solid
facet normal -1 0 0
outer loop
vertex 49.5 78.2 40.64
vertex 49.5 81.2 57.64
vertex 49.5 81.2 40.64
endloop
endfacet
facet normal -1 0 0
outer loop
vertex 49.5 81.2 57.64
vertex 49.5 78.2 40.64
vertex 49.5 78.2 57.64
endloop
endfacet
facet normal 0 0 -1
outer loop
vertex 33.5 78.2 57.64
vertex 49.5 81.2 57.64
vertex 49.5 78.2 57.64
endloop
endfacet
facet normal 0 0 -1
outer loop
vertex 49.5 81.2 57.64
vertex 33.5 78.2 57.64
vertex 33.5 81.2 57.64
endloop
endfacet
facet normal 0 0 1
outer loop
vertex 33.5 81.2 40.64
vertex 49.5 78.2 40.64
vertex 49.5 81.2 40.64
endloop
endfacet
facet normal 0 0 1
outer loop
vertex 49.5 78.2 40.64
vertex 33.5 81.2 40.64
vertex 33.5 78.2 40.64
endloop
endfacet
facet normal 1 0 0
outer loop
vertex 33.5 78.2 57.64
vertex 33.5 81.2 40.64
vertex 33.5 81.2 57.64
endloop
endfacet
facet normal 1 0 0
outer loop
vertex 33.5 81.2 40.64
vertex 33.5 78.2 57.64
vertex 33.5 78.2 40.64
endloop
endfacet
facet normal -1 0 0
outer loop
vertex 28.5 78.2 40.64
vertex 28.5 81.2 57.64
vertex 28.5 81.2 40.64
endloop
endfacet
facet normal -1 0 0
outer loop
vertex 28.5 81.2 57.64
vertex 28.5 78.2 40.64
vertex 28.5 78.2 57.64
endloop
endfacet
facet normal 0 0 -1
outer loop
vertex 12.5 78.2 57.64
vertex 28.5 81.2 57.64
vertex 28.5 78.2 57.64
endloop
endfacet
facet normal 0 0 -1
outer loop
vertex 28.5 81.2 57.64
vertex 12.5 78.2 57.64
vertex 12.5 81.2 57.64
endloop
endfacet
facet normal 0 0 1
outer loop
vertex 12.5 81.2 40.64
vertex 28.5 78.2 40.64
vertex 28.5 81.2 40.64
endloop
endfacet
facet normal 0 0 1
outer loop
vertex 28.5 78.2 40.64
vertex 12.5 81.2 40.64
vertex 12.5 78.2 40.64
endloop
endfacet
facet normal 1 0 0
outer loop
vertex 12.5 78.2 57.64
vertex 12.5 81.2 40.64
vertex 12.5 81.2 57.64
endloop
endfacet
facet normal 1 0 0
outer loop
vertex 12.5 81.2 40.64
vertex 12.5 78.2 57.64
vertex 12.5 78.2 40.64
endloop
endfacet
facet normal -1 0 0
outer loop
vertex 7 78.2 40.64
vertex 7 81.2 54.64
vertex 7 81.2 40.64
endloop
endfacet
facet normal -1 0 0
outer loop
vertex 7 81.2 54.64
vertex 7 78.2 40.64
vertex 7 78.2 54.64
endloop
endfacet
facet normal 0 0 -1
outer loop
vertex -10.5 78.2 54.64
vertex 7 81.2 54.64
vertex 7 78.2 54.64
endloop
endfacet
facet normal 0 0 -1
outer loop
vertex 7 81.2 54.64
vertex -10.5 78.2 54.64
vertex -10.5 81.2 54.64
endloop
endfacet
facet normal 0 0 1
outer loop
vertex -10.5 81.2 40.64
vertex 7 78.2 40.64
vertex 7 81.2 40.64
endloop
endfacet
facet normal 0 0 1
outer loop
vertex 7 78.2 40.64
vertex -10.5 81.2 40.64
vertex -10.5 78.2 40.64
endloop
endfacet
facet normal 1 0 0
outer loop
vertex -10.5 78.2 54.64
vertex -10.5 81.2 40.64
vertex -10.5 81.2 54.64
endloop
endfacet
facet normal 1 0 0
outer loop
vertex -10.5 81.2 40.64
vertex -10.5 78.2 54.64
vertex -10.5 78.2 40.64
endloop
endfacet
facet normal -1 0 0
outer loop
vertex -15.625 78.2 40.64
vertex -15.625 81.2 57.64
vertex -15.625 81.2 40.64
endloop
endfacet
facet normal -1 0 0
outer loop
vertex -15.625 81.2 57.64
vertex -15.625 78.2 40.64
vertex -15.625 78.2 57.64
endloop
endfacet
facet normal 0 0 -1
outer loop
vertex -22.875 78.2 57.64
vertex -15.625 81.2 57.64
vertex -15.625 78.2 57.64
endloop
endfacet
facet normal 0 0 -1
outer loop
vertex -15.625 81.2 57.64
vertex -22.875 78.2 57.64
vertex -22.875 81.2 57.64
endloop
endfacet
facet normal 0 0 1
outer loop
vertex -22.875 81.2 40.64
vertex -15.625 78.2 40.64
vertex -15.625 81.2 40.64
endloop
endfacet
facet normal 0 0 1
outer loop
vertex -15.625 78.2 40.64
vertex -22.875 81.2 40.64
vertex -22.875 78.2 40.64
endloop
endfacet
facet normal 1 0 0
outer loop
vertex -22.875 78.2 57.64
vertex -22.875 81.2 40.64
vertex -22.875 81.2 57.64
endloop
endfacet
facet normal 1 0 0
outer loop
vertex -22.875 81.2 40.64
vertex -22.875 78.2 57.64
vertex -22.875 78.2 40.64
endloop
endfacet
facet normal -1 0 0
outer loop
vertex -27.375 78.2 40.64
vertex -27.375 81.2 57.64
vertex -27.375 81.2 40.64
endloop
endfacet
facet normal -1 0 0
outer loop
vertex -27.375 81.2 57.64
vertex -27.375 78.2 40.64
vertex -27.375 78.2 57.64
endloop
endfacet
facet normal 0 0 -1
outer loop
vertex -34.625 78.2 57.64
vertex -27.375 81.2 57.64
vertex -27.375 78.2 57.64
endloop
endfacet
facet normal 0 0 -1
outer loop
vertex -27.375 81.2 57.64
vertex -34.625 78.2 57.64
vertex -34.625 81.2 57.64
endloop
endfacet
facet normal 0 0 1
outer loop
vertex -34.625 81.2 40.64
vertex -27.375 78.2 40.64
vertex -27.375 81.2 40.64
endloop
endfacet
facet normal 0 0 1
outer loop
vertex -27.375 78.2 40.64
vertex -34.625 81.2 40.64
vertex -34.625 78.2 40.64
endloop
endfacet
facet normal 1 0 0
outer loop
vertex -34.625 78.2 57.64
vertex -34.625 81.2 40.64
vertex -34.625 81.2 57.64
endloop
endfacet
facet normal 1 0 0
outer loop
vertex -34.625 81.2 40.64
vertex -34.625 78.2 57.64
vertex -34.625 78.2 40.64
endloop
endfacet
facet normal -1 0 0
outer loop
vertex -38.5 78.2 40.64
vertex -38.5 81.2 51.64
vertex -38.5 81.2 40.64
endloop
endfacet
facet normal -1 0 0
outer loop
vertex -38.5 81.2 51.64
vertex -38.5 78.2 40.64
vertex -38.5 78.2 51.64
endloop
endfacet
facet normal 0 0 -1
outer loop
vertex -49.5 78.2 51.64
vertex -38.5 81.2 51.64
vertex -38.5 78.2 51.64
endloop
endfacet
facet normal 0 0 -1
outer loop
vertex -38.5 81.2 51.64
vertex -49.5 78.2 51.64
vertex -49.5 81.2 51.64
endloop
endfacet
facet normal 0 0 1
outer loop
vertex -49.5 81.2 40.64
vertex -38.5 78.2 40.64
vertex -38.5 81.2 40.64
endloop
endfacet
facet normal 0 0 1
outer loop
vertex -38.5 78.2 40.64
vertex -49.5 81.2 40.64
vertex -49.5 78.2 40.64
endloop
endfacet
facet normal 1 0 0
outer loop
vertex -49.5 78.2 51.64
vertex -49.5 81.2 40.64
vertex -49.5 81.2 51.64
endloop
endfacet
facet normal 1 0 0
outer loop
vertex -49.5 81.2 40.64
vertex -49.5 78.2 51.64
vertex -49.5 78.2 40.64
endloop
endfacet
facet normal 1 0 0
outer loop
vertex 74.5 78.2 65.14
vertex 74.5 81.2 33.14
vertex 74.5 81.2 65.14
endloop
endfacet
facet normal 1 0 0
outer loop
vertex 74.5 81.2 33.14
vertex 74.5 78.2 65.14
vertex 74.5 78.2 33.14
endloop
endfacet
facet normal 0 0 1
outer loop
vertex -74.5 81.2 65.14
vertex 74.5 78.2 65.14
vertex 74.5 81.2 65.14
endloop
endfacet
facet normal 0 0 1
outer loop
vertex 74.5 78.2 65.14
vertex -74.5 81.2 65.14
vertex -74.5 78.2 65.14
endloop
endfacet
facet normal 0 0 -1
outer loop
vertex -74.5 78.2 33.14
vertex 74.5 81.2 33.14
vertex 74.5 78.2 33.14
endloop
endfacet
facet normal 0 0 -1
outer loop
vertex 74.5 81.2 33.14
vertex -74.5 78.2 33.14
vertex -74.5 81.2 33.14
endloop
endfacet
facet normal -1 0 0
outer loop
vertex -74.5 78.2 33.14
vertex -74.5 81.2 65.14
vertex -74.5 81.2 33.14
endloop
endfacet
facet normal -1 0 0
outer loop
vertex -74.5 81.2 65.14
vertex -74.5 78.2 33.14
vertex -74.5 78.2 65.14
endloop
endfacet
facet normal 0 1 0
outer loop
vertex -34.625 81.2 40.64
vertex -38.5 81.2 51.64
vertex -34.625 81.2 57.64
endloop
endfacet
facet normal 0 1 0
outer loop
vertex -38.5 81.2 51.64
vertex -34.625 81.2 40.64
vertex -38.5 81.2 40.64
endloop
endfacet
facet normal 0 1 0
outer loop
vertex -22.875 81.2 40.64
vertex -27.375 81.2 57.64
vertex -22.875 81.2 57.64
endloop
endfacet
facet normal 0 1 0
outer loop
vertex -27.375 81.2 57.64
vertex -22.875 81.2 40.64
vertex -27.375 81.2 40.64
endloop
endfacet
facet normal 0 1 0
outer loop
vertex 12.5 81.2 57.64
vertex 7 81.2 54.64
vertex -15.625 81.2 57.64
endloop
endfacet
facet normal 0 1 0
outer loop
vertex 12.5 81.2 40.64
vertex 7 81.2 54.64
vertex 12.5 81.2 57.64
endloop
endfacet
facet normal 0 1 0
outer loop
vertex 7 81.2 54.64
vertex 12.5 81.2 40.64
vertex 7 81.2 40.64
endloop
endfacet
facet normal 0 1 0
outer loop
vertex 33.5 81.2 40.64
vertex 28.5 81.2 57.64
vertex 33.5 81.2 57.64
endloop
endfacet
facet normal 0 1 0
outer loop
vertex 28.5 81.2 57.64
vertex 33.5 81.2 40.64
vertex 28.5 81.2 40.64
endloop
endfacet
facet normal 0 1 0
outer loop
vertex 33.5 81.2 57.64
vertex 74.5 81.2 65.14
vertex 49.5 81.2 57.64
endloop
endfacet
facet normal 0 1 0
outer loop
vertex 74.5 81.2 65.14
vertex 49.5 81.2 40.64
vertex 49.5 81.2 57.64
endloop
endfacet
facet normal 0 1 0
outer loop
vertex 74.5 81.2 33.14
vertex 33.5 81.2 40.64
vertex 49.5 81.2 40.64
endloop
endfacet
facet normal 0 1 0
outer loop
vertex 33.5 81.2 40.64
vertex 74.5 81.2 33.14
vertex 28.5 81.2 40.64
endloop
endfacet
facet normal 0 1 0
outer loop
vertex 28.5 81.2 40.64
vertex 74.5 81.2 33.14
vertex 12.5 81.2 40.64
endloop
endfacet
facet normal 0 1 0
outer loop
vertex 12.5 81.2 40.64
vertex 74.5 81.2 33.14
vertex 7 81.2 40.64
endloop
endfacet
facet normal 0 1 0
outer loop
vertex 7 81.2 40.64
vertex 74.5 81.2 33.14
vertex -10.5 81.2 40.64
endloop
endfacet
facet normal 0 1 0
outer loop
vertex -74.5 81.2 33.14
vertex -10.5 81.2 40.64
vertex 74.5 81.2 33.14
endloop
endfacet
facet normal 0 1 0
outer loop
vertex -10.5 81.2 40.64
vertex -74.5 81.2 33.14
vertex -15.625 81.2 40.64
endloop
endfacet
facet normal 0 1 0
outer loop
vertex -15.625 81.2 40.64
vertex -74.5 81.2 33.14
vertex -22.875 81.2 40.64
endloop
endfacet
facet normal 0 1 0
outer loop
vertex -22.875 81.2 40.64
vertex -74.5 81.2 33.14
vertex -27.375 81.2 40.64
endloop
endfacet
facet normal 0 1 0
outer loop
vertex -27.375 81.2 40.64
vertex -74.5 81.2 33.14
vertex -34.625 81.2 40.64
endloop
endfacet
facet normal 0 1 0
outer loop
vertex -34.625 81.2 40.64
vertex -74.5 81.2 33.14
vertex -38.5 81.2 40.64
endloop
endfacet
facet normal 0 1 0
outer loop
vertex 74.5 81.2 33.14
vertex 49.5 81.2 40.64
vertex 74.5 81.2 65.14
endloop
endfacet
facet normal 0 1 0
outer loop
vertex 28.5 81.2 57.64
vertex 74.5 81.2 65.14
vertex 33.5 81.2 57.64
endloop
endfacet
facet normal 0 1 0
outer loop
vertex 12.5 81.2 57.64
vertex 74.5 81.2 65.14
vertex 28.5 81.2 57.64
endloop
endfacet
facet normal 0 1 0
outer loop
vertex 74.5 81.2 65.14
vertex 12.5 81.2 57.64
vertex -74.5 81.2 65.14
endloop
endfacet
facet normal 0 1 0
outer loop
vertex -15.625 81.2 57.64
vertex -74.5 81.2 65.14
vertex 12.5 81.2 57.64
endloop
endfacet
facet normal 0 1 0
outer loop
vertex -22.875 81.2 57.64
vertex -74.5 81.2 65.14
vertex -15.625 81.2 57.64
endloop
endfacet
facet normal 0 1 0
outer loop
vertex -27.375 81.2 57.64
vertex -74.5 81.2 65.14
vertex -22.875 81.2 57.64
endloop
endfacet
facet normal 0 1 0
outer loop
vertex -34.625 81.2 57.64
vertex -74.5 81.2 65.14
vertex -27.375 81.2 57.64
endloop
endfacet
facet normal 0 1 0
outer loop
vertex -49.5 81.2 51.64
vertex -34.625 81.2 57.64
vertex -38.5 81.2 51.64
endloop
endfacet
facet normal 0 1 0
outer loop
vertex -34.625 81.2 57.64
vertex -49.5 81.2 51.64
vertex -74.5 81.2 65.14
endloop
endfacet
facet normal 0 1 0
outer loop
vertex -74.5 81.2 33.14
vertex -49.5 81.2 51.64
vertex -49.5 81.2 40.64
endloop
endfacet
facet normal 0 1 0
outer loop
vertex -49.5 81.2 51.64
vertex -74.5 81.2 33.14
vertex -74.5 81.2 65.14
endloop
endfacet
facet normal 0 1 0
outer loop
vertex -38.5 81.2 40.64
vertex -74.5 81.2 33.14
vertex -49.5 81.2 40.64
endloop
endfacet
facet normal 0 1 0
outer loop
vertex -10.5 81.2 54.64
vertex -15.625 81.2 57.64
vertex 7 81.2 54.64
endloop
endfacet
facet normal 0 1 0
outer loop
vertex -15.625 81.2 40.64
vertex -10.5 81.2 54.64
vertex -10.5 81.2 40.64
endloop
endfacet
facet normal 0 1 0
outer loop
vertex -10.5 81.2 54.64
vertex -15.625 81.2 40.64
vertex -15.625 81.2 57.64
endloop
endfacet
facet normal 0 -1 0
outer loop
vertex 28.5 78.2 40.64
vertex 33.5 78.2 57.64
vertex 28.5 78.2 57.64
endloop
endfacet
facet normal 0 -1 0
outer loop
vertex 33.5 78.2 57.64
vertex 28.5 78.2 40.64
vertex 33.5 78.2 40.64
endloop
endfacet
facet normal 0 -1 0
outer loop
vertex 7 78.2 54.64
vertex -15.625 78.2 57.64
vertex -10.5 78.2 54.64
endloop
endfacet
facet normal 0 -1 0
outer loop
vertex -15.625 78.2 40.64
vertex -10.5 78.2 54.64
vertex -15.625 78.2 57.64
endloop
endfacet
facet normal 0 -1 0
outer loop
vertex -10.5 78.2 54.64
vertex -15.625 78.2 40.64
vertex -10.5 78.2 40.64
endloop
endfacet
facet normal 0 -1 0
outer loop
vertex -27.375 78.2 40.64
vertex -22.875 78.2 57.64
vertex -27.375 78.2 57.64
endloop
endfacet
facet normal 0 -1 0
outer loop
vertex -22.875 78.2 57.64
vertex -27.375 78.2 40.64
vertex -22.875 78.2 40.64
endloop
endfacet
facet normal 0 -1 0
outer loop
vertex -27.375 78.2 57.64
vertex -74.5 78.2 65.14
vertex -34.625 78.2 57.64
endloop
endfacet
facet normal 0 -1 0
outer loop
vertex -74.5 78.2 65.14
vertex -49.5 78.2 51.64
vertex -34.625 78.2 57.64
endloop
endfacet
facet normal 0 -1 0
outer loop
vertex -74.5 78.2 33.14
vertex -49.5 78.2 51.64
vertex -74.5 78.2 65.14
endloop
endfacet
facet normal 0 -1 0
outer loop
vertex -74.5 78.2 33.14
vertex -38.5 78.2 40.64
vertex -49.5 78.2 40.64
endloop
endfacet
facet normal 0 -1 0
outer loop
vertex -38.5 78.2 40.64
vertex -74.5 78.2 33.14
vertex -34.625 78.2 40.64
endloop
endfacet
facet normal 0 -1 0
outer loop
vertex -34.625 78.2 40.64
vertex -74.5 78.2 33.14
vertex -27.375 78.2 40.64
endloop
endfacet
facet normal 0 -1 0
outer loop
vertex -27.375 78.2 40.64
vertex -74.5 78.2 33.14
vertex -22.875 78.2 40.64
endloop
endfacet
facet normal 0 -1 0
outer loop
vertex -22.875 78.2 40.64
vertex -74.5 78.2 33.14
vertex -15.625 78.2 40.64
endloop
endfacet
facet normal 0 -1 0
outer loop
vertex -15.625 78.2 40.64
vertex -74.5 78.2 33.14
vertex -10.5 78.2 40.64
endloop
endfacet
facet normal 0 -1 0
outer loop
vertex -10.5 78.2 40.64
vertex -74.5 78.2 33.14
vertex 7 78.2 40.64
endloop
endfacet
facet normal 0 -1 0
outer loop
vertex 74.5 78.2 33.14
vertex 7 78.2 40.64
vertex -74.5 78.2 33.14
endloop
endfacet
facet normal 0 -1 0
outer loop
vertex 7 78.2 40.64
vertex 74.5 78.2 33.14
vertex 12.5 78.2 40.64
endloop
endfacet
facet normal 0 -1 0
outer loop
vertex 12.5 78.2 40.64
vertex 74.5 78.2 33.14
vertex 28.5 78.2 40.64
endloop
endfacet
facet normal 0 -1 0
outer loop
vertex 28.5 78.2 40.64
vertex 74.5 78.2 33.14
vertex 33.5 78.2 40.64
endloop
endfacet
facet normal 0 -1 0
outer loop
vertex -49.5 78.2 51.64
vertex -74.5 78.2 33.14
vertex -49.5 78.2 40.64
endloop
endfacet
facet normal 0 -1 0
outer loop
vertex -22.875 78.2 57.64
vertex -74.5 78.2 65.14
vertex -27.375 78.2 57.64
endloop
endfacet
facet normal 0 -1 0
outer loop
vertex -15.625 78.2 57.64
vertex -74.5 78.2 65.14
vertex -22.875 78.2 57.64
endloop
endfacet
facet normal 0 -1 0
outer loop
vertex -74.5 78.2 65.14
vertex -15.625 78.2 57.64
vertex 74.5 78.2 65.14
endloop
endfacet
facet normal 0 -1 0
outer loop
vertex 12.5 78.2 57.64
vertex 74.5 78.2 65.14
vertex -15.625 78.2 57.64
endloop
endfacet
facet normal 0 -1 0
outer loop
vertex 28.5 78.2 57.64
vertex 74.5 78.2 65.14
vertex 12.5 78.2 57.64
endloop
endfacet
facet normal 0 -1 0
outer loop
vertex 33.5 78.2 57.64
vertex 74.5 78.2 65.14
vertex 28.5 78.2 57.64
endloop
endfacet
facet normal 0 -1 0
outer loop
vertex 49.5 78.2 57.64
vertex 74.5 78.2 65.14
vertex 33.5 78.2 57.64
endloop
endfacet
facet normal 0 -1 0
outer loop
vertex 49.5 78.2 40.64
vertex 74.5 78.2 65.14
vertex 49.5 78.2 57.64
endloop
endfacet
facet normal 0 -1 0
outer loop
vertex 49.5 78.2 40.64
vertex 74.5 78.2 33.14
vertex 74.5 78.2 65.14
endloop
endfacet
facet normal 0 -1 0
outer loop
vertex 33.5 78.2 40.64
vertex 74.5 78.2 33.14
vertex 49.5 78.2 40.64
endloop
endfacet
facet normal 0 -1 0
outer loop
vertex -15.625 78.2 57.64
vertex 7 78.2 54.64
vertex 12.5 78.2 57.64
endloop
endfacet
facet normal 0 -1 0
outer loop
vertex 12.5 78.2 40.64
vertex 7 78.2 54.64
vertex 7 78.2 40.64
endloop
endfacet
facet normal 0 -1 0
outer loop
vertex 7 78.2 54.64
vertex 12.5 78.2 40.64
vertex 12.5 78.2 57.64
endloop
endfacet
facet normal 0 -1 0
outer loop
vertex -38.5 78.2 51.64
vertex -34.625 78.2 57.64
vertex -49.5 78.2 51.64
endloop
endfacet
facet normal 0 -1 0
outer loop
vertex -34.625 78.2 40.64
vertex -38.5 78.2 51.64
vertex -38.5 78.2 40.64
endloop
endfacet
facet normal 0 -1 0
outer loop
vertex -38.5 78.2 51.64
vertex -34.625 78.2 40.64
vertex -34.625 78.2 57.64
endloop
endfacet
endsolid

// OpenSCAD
//
// ============================================================================
// SteamMachine UM790
// Project Phoenix
//
// Archivo  : probeta_panel_trasero.scad
// Versión  : 1.0
// Fecha    : 2026-08-16
// Autor    : Pep Ventura (asistido por Claude)
//
// PROBETA DE PRUEBA — no es la pieza definitiva. Solo la franja con
// los 6 recortes de conectores (rearIOCut(), reutilizado tal cual del
// panel trasero real — así se garantiza que los recortes son
// EXACTAMENTE los mismos que llevará la pieza definitiva, no una
// aproximación aparte), sobre una placa mucho más pequeña que el
// panel completo (150mm de ancho).
//
// PEDIDO POR EL USUARIO (2026-08-16): "¿Podrías preparar este
// fichero pero para imprimir una prueba? [...] más estrecho y así
// verificamos las medidas en el chasis antes de imprimir el
// definitivo" — tras pasar las medidas reales del CAD de los
// conectores traseros.
//
// CÓMO USARLA: imprime esta pieza tal cual y pruébala contra la
// placa UM790 ya montada en el chasis — con las medidas reales del
// CAD debería alinear directamente con los conectores. Si algo no
// encaja, dímelo con la mayor precisión posible (qué conector, en
// qué dirección y cuánto) antes de dar la pieza definitiva por buena.
//
// ============================================================================

include <../../../00_parametros.scad>;
include <../../reference/components/assembly_positions.scad>;

use <rear_panel.scad>;

$fn = 32;

//=============================================================================
// PLACA DE LA PROBETA — ANCHO COMPLETO (extremo a extremo, igual que
// el panel real) para poder comprobar que el centrado coincide con
// las paredes reales del chasis, no solo las posiciones relativas
// entre conectores. Solo se recorta la ALTURA (mucho más baja que el
// panel completo), para que la pieza siga siendo rápida de imprimir.
//
// PEDIDO POR EL USUARIO (2026-08-16): "mejor que sea de extremo a
// extremo (derecha e izquierda), para verificar que esté bien
// centrado con las salidas reales del UM790" — versión anterior
// (119mm, solo el ancho de los conectores) sustituida por esta.
//
// AJUSTADO (2026-08-16, tras la prueba física): "la probeta del
// panel trasero también debería hacer 149mm de ancho" — mismo
// ajuste que el resto de paneles (rear_panel_width en
// rear_panel.scad), confirmado con la prueba real: encajaba bien
// ajustándolo desde la izquierda (lado USB), con sobrante por la
// derecha (lado DC) — coincide con el mismo 1mm de exceso ya
// corregido en los paneles frontales.
//=============================================================================

probeta_margin_z = 8;   // margen por encima/debajo del conector más alto/bajo

probeta_span_x = rear_panel_width;  // 149mm — mismo ancho que el panel trasero real (rear_panel.scad)
probeta_z_low  = 41.14 - probeta_margin_z;  // suelo del conector DC, con margen
probeta_z_high = 57.14 + probeta_margin_z;  // techo del USB/HDMI, con margen

module probetaPanelTrasero()
{

    difference()
    {

        translate([
            -probeta_span_x/2,
            case_depth/2 - wall_thickness,
            probeta_z_low
        ])

            cube([probeta_span_x, wall_thickness, probeta_z_high-probeta_z_low]);

        rearIOCut();

    }

}

probetaPanelTrasero();
